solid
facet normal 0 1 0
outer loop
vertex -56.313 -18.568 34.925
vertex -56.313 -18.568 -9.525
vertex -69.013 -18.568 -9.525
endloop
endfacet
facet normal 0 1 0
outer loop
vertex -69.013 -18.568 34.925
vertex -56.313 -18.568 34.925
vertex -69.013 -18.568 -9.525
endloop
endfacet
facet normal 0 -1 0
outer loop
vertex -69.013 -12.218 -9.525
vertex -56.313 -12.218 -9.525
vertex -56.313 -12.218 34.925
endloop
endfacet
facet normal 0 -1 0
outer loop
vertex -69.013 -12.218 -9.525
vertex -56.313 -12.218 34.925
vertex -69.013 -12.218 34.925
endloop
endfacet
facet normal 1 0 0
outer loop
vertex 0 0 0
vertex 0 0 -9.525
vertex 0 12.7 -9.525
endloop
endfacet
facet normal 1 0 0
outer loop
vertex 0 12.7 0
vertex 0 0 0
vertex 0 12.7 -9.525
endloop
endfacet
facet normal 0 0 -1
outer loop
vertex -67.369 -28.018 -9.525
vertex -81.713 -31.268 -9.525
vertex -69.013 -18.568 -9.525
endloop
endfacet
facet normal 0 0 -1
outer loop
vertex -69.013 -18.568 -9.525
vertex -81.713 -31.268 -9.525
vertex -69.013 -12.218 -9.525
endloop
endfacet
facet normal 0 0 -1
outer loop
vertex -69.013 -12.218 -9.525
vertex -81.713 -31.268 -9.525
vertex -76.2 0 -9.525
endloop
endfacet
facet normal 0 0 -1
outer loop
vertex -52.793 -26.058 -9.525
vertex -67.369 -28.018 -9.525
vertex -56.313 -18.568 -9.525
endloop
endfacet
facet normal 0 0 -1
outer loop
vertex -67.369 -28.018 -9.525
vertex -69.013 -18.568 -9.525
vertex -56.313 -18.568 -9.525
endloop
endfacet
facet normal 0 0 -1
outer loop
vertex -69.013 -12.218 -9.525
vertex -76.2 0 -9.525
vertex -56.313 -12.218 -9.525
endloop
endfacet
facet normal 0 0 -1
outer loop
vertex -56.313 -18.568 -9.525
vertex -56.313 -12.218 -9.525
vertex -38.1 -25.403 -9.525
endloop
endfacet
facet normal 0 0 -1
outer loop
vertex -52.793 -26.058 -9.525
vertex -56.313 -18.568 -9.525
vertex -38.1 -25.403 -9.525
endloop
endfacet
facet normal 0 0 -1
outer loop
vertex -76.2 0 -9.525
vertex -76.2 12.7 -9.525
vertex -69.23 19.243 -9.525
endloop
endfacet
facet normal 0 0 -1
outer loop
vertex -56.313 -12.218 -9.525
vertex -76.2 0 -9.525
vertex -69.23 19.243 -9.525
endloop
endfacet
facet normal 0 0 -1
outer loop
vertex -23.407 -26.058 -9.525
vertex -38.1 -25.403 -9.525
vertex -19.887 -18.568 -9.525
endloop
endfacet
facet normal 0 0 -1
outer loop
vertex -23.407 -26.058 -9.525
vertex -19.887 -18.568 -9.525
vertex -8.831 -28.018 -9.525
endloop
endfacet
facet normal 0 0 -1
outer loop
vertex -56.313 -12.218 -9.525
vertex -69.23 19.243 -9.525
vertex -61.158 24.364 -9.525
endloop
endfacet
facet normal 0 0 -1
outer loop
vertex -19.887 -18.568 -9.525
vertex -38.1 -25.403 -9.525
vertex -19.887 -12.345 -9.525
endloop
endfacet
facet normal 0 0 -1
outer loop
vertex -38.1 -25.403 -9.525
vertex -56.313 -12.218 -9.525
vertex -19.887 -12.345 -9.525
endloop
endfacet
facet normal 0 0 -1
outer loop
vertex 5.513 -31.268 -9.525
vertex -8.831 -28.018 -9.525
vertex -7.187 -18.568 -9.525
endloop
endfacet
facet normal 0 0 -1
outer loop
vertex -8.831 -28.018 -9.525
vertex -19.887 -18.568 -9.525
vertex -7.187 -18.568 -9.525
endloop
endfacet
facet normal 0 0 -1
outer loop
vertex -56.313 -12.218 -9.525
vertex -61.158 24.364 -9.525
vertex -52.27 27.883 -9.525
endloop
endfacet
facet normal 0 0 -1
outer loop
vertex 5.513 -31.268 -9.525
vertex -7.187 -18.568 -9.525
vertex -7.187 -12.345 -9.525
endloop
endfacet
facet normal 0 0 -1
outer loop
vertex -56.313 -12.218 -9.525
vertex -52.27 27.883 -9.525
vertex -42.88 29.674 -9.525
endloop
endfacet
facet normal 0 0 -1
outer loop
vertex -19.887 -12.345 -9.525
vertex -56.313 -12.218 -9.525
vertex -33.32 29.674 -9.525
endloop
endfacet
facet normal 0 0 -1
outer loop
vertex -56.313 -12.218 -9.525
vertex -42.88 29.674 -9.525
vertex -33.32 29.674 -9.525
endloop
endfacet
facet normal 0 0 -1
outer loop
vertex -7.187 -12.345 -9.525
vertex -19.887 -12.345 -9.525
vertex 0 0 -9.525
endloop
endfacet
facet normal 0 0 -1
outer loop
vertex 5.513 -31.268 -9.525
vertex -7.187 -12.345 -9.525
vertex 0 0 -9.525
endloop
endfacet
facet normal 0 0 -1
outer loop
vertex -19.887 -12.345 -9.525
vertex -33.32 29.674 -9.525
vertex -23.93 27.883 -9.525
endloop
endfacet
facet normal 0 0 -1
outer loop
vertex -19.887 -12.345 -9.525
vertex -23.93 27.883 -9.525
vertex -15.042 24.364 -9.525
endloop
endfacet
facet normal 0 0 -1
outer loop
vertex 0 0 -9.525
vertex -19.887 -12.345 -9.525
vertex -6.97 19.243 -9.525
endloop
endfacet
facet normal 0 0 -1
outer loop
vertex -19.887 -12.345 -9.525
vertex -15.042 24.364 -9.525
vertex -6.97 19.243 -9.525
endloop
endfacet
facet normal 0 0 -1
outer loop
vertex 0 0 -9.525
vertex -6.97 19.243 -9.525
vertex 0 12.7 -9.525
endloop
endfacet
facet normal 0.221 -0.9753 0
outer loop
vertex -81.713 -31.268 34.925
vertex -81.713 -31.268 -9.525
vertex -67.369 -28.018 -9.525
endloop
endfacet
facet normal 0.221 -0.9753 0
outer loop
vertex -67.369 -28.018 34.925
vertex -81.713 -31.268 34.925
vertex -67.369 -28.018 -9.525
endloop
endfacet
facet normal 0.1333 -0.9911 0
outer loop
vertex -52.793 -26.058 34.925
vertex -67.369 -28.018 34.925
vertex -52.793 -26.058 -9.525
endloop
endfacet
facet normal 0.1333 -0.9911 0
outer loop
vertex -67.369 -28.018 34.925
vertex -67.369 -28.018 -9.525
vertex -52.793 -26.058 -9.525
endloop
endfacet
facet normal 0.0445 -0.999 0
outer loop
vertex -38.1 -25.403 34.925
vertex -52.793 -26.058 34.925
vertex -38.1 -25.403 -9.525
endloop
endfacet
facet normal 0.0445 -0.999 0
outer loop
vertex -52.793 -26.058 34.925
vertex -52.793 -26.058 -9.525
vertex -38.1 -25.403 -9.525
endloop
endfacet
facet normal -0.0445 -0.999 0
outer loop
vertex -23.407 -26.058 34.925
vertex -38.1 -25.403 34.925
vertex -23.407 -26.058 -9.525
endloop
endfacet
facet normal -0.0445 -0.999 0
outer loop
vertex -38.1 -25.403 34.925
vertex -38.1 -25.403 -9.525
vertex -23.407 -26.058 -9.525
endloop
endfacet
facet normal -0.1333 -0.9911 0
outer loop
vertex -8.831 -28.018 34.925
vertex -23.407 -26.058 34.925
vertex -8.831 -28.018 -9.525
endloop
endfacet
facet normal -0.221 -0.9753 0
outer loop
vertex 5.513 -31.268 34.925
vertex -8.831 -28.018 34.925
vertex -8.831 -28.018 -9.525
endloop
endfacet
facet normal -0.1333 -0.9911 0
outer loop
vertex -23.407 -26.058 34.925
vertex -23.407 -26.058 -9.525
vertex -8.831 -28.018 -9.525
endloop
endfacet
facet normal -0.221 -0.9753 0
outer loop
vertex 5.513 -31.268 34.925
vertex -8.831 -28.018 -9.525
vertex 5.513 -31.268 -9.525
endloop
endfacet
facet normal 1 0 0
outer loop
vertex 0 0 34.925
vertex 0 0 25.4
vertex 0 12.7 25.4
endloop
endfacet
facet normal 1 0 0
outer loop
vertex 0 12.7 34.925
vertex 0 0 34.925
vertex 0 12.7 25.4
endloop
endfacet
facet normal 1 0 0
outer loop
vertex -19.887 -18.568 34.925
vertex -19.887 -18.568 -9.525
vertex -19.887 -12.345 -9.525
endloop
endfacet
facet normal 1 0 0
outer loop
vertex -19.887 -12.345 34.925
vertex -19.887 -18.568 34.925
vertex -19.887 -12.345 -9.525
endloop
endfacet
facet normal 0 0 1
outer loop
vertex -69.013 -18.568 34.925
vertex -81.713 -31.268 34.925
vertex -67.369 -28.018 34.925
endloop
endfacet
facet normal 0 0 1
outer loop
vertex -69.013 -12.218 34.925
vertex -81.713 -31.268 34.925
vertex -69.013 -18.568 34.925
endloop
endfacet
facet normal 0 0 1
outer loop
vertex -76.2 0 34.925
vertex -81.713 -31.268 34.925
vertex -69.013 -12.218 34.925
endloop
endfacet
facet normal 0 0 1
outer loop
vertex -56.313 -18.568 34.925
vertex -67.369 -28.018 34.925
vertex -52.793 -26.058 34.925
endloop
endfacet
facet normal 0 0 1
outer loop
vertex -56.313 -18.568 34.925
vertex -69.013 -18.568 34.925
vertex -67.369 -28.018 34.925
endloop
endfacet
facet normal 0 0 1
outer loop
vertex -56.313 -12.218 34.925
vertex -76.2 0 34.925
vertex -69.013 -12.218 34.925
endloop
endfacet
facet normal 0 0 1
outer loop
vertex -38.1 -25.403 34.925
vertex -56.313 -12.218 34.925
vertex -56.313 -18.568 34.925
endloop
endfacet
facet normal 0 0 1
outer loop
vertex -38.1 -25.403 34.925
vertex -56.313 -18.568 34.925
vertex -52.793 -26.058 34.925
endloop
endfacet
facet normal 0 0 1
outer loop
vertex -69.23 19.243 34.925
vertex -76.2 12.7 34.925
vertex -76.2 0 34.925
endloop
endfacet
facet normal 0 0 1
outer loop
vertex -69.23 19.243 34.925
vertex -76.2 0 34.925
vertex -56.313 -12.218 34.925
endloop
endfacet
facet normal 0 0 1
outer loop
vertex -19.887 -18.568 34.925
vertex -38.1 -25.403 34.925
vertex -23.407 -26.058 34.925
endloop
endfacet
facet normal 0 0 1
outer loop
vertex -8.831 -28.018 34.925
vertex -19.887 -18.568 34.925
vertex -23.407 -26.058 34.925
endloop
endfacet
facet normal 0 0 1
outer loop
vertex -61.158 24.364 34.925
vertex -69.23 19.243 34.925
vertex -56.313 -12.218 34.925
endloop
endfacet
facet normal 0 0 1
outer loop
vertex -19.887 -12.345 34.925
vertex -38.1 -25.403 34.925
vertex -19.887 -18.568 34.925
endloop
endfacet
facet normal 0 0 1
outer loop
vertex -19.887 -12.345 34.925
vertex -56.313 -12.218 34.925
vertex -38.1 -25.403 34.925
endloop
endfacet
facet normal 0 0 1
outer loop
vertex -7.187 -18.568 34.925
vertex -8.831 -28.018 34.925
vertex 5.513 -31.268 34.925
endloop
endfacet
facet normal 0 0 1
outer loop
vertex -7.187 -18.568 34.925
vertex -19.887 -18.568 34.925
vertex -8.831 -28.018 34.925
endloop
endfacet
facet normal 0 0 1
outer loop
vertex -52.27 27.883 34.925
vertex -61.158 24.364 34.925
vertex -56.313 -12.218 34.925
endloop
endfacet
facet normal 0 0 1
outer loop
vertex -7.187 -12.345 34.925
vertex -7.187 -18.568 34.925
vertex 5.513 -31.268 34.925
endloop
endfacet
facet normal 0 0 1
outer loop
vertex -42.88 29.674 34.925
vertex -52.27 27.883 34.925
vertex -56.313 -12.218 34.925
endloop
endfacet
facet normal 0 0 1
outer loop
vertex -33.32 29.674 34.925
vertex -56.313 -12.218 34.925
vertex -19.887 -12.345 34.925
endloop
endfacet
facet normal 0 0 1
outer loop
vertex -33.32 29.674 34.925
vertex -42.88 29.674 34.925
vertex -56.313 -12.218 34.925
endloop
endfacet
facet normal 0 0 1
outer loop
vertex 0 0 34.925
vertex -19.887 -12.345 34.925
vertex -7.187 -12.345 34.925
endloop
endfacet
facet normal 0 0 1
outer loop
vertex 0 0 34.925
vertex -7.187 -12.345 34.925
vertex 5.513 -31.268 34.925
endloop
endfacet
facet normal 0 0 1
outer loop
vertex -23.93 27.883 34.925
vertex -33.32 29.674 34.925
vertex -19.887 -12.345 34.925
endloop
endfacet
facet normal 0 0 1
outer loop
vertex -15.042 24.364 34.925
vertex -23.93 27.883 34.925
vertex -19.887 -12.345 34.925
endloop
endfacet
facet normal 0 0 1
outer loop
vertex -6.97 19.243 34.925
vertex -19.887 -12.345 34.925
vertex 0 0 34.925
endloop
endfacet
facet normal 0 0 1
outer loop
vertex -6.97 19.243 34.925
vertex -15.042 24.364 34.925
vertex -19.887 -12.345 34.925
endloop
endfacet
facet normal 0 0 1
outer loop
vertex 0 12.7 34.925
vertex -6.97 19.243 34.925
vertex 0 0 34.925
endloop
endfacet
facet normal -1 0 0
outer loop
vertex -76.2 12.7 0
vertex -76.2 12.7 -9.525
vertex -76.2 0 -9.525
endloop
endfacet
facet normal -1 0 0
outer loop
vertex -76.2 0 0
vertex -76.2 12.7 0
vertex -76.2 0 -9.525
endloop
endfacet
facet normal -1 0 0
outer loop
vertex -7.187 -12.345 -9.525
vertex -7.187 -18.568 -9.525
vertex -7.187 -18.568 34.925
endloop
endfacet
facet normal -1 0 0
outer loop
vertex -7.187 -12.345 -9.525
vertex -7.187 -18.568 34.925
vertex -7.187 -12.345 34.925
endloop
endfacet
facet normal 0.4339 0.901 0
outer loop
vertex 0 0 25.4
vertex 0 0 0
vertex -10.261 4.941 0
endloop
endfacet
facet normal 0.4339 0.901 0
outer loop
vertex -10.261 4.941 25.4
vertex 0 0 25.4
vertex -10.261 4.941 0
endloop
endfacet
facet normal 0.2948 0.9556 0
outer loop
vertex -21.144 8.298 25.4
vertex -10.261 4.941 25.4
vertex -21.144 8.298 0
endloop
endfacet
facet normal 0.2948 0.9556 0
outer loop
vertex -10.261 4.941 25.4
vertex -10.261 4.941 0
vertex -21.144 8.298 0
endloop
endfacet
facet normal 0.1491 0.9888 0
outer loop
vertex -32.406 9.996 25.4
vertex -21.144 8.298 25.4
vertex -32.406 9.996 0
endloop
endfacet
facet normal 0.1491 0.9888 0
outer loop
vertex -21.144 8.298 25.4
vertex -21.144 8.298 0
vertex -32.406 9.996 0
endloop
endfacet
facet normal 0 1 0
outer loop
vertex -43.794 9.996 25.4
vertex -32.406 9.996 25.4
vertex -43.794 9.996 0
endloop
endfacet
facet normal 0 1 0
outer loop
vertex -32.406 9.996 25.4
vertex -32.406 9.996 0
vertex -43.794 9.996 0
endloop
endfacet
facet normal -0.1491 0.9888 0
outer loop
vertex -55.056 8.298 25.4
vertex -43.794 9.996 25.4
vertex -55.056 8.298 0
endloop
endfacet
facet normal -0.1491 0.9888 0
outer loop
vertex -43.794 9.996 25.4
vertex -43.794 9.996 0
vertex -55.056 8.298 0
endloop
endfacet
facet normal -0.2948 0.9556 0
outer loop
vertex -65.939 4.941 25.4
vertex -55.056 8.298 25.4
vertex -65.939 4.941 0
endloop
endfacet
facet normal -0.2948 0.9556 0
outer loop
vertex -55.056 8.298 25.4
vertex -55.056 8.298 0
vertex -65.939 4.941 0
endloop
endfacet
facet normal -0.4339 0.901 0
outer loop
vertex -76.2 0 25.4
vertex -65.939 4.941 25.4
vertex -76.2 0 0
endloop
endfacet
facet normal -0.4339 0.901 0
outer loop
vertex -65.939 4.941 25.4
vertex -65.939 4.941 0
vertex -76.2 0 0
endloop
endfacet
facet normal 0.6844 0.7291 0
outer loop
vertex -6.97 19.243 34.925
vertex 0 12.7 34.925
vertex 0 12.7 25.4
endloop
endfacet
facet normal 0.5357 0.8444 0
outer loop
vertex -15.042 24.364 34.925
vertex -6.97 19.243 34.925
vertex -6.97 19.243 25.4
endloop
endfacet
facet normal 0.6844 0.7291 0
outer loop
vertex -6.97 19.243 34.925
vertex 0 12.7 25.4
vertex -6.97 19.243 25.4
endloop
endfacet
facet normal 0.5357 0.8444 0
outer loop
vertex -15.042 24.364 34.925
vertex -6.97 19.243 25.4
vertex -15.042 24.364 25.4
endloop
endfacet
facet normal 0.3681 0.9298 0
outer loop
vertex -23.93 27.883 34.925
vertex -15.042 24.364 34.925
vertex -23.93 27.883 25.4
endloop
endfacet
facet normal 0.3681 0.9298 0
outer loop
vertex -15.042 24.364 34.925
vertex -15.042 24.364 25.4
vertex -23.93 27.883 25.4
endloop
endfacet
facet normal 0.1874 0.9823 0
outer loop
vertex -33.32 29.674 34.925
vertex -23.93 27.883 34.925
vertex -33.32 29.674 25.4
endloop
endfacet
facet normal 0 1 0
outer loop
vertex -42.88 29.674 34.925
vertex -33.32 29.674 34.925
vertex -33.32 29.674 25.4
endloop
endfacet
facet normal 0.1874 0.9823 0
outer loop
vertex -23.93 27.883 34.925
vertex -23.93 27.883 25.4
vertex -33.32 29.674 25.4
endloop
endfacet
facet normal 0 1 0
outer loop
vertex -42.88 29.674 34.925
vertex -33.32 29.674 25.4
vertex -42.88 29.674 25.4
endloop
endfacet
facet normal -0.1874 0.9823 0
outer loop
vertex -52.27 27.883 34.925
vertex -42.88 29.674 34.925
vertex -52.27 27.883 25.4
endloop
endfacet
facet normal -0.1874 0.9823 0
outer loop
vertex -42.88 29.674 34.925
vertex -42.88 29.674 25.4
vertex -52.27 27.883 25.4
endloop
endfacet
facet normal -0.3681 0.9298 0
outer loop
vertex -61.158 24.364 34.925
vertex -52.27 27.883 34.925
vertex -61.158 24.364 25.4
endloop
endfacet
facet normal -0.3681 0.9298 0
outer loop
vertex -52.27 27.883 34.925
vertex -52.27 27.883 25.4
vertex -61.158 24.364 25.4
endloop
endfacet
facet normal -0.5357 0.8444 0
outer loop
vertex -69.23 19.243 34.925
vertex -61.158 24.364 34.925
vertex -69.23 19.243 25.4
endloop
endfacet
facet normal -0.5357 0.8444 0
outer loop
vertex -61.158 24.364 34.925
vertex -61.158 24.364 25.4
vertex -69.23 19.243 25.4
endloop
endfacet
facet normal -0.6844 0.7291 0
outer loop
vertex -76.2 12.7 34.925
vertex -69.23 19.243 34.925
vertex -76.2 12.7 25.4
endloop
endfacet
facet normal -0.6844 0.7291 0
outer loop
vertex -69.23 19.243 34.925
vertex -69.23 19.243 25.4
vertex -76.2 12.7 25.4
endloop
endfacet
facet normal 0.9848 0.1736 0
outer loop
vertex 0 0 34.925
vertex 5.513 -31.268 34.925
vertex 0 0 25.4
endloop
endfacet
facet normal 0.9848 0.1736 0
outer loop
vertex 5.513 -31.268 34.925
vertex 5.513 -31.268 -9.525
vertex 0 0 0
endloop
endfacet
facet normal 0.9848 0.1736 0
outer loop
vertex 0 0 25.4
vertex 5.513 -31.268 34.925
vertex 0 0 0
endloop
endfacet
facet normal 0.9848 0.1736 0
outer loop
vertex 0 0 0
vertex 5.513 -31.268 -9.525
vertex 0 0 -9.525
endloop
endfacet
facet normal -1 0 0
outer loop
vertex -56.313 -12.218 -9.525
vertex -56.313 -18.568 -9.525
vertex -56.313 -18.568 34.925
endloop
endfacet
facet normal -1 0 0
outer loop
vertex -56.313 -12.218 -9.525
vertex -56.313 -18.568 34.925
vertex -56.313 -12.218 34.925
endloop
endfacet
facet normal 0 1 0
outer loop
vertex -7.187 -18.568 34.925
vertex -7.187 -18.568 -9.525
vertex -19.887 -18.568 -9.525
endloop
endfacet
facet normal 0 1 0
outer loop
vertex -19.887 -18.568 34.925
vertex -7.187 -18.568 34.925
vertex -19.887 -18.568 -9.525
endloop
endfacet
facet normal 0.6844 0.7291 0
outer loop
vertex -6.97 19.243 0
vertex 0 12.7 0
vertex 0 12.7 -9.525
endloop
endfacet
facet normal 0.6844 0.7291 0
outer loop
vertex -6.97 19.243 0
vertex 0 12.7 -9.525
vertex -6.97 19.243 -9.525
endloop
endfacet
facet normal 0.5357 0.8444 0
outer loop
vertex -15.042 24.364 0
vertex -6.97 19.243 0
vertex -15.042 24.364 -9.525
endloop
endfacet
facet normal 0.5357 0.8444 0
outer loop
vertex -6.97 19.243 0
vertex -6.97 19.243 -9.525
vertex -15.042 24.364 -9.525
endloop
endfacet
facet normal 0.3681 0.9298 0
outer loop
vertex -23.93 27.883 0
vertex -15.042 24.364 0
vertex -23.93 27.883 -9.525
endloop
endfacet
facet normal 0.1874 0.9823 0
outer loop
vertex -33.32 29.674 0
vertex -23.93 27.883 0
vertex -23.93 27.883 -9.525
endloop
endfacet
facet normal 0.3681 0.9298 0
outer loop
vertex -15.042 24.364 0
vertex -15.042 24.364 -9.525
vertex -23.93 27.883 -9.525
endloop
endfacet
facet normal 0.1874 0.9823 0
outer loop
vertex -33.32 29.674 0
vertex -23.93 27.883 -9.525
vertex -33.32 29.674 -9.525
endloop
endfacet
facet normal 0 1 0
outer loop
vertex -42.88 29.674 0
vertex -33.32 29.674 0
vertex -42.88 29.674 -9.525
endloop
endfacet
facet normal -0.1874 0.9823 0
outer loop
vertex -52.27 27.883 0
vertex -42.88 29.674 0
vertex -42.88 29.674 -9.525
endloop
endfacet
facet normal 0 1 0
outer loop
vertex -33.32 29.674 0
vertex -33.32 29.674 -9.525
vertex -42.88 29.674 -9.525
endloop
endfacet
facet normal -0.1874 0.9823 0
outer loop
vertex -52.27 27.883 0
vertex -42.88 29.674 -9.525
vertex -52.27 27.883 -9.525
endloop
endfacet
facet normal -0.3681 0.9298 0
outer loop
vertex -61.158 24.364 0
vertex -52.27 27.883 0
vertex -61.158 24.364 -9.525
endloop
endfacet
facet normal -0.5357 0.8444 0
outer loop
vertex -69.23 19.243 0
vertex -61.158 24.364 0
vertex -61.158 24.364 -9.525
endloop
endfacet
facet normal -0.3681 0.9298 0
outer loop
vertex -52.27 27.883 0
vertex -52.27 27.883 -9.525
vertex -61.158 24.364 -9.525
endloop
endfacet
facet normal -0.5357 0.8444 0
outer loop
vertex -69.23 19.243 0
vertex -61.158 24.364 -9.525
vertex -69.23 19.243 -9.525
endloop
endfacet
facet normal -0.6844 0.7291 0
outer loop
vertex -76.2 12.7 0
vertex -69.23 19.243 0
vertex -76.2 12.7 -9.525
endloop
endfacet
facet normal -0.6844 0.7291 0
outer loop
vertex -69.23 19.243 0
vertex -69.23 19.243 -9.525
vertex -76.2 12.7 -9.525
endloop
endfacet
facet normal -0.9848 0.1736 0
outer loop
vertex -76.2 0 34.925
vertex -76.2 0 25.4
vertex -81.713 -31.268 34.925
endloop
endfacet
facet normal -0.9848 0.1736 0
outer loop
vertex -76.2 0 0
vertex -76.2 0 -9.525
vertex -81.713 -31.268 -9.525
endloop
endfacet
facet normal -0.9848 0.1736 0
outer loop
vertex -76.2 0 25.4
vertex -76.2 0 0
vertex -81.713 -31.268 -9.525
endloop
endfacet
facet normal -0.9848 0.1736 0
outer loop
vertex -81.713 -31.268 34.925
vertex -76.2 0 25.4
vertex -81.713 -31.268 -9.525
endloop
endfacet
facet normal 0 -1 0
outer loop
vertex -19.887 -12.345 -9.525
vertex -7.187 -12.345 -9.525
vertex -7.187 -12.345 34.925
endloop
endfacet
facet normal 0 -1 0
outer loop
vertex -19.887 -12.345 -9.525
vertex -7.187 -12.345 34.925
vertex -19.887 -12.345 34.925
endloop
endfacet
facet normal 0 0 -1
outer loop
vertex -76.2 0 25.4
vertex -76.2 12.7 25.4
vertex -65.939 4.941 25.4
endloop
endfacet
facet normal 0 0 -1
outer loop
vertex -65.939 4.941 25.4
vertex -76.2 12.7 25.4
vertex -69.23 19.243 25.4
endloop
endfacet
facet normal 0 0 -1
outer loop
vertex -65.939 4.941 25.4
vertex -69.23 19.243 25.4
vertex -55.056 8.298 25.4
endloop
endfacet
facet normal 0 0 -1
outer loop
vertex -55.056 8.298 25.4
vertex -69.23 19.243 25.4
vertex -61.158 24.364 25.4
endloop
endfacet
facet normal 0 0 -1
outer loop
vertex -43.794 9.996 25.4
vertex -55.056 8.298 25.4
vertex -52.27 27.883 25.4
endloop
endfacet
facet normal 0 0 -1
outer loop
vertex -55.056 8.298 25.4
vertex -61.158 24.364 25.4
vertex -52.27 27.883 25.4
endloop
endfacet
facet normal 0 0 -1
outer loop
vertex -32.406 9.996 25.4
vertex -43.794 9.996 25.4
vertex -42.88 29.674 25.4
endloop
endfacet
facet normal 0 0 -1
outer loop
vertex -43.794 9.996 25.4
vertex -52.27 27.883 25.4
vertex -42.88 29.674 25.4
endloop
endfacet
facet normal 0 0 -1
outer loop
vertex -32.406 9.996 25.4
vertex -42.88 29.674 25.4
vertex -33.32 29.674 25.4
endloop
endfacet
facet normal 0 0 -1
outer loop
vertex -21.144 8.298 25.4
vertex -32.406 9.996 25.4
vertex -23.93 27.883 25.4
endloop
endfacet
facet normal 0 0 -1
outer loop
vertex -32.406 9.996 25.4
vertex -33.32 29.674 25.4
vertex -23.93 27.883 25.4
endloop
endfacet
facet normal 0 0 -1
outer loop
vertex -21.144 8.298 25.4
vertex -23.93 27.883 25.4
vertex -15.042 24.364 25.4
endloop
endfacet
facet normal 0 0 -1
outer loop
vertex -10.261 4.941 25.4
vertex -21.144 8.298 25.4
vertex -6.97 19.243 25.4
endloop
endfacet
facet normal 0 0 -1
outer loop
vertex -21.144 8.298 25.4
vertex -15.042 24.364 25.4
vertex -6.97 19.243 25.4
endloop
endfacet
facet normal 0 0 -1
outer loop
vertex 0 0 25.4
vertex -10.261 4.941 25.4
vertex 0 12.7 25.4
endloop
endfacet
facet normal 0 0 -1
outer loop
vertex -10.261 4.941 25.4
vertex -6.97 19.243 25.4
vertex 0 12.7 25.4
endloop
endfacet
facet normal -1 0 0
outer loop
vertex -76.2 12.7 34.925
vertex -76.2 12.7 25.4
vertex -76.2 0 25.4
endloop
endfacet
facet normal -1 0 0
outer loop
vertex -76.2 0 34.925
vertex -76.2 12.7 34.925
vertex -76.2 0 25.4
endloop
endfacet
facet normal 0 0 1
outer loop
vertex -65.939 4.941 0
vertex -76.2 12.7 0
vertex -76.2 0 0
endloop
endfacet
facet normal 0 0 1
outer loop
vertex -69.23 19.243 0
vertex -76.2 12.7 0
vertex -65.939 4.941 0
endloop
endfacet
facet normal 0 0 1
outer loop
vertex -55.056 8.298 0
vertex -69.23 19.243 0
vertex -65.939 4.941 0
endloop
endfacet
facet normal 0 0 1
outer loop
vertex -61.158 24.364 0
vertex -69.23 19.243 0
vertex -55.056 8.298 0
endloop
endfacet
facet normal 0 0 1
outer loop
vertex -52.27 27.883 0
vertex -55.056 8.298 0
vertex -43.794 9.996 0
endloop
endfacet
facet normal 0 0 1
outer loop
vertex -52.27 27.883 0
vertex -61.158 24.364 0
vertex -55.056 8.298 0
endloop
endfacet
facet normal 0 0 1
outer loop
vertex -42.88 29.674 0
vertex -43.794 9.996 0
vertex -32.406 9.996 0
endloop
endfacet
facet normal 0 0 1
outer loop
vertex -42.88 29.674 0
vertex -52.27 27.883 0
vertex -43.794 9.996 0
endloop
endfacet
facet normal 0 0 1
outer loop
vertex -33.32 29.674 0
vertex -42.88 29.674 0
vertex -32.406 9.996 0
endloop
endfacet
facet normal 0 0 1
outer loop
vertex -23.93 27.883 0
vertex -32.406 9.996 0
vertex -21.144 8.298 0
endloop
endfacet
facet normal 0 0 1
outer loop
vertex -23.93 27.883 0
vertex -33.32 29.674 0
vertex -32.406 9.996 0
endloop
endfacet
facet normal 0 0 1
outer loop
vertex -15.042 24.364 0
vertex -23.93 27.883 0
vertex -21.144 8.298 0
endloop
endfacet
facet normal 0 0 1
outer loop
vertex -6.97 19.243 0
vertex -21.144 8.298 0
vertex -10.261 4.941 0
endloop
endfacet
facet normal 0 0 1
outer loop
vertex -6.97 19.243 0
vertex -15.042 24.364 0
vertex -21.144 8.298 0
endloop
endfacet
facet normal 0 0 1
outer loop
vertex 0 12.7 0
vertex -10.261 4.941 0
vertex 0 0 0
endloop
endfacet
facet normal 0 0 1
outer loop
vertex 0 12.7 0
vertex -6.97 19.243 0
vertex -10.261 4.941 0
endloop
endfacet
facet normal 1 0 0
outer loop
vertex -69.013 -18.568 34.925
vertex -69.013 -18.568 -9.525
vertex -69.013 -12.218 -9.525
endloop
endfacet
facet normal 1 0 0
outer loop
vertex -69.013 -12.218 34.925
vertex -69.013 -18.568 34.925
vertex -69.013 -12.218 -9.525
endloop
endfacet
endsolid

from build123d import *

# Parameters (mm, degrees)
BOSS_EXTRUDE1_DEPTH = 25.4
BOSS_EXTRUDE2_DEPTH = 9.525
BOSS_EXTRUDE3_START = 9.525
BOSS_EXTRUDE3_DEPTH = 9.525
CUT_EXTRUDE2_DEPTH  = 99.135296592
SKETCH6_W           = 12.7
SKETCH6_H           = 6.223
SKETCH6_H_2         = 6.35
CUT_EXTRUDE3_DEPTH  = 99.135296592


with BuildPart() as part:
    # Sketch1 → Boss-Extrude1 (new body)
    with BuildSketch(Plane.XY):
        with BuildLine():
            Line((-76.2, 0), (-81.713329641, -31.267646158))
            Line((-81.713329641, -31.267646158), (5.513329641, -31.267646158))
            Line((5.513329641, -31.267646158), (0, 0))
            ThreePointArc((0, 0), (-38.1, 10.208864232), (-76.2, 0))
        make_face()
    extrude(amount=BOSS_EXTRUDE1_DEPTH)

    # Sketch2 → Boss-Extrude2 (add)
    with BuildSketch(Plane.XY.offset(25.4)):
        with BuildLine():
            Line((-76.2, 12.7), (-76.2, 0))
            Line((-76.2, 0), (-81.713329641, -31.267646158))
            Line((-81.713329641, -31.267646158), (5.513329641, -31.267646158))
            Line((5.513329641, -31.267646158), (0, 0))
            Line((0, 0), (0, 12.7))
            ThreePointArc((0, 12.7), (-38.1, 29.898958349), (-76.2, 12.7))
        make_face()
    extrude(amount=BOSS_EXTRUDE2_DEPTH)

    # Sketch3 → Boss-Extrude3 (add)
    with BuildSketch(Plane(origin=(0, 0, 0), x_dir=(-1, 0, 0), z_dir=(0, 0, -1)).offset(BOSS_EXTRUDE3_START)):
        with BuildLine():
            Line((0, 0), (0, 12.7))
            ThreePointArc((0, 12.7), (38.1, 29.898958349), (76.2, 12.7))
            Line((76.2, 12.7), (76.2, 0))
            Line((76.2, 0), (81.713329641, -31.267646158))
            Line((81.713329641, -31.267646158), (-5.513329641, -31.267646158))
            Line((-5.513329641, -31.267646158), (0, 0))
        make_face()
    extrude(amount=-BOSS_EXTRUDE3_DEPTH)

    # Sketch5 → Cut-Extrude2 (cut, through all)
    with BuildSketch(Plane(origin=(0, 0, -9.525), x_dir=(-1, 0, 0), z_dir=(0, 0, -1))):
        with BuildLine():
            Line((-5.513329641, -31.267646158), (81.713329641, -31.267646158))
            ThreePointArc((81.713329641, -31.267646158), (38.1, -25.402967232), (-5.513329641, -31.267646158))
        make_face()
    extrude(amount=-CUT_EXTRUDE2_DEPTH, mode=Mode.SUBTRACT)

    # Sketch6 → Cut-Extrude3 (cut, through all)
    with BuildSketch(Plane(origin=(0, 0, -9.525), x_dir=(-1, 0, 0), z_dir=(0, 0, -1))):
        with Locations((13.536670359, -15.456146158)):
            Rectangle(SKETCH6_W, SKETCH6_H)
        with Locations((62.663329641, -15.392646158)):
            Rectangle(SKETCH6_W, SKETCH6_H_2)
    extrude(amount=-CUT_EXTRUDE3_DEPTH, mode=Mode.SUBTRACT)


solid = part.part
